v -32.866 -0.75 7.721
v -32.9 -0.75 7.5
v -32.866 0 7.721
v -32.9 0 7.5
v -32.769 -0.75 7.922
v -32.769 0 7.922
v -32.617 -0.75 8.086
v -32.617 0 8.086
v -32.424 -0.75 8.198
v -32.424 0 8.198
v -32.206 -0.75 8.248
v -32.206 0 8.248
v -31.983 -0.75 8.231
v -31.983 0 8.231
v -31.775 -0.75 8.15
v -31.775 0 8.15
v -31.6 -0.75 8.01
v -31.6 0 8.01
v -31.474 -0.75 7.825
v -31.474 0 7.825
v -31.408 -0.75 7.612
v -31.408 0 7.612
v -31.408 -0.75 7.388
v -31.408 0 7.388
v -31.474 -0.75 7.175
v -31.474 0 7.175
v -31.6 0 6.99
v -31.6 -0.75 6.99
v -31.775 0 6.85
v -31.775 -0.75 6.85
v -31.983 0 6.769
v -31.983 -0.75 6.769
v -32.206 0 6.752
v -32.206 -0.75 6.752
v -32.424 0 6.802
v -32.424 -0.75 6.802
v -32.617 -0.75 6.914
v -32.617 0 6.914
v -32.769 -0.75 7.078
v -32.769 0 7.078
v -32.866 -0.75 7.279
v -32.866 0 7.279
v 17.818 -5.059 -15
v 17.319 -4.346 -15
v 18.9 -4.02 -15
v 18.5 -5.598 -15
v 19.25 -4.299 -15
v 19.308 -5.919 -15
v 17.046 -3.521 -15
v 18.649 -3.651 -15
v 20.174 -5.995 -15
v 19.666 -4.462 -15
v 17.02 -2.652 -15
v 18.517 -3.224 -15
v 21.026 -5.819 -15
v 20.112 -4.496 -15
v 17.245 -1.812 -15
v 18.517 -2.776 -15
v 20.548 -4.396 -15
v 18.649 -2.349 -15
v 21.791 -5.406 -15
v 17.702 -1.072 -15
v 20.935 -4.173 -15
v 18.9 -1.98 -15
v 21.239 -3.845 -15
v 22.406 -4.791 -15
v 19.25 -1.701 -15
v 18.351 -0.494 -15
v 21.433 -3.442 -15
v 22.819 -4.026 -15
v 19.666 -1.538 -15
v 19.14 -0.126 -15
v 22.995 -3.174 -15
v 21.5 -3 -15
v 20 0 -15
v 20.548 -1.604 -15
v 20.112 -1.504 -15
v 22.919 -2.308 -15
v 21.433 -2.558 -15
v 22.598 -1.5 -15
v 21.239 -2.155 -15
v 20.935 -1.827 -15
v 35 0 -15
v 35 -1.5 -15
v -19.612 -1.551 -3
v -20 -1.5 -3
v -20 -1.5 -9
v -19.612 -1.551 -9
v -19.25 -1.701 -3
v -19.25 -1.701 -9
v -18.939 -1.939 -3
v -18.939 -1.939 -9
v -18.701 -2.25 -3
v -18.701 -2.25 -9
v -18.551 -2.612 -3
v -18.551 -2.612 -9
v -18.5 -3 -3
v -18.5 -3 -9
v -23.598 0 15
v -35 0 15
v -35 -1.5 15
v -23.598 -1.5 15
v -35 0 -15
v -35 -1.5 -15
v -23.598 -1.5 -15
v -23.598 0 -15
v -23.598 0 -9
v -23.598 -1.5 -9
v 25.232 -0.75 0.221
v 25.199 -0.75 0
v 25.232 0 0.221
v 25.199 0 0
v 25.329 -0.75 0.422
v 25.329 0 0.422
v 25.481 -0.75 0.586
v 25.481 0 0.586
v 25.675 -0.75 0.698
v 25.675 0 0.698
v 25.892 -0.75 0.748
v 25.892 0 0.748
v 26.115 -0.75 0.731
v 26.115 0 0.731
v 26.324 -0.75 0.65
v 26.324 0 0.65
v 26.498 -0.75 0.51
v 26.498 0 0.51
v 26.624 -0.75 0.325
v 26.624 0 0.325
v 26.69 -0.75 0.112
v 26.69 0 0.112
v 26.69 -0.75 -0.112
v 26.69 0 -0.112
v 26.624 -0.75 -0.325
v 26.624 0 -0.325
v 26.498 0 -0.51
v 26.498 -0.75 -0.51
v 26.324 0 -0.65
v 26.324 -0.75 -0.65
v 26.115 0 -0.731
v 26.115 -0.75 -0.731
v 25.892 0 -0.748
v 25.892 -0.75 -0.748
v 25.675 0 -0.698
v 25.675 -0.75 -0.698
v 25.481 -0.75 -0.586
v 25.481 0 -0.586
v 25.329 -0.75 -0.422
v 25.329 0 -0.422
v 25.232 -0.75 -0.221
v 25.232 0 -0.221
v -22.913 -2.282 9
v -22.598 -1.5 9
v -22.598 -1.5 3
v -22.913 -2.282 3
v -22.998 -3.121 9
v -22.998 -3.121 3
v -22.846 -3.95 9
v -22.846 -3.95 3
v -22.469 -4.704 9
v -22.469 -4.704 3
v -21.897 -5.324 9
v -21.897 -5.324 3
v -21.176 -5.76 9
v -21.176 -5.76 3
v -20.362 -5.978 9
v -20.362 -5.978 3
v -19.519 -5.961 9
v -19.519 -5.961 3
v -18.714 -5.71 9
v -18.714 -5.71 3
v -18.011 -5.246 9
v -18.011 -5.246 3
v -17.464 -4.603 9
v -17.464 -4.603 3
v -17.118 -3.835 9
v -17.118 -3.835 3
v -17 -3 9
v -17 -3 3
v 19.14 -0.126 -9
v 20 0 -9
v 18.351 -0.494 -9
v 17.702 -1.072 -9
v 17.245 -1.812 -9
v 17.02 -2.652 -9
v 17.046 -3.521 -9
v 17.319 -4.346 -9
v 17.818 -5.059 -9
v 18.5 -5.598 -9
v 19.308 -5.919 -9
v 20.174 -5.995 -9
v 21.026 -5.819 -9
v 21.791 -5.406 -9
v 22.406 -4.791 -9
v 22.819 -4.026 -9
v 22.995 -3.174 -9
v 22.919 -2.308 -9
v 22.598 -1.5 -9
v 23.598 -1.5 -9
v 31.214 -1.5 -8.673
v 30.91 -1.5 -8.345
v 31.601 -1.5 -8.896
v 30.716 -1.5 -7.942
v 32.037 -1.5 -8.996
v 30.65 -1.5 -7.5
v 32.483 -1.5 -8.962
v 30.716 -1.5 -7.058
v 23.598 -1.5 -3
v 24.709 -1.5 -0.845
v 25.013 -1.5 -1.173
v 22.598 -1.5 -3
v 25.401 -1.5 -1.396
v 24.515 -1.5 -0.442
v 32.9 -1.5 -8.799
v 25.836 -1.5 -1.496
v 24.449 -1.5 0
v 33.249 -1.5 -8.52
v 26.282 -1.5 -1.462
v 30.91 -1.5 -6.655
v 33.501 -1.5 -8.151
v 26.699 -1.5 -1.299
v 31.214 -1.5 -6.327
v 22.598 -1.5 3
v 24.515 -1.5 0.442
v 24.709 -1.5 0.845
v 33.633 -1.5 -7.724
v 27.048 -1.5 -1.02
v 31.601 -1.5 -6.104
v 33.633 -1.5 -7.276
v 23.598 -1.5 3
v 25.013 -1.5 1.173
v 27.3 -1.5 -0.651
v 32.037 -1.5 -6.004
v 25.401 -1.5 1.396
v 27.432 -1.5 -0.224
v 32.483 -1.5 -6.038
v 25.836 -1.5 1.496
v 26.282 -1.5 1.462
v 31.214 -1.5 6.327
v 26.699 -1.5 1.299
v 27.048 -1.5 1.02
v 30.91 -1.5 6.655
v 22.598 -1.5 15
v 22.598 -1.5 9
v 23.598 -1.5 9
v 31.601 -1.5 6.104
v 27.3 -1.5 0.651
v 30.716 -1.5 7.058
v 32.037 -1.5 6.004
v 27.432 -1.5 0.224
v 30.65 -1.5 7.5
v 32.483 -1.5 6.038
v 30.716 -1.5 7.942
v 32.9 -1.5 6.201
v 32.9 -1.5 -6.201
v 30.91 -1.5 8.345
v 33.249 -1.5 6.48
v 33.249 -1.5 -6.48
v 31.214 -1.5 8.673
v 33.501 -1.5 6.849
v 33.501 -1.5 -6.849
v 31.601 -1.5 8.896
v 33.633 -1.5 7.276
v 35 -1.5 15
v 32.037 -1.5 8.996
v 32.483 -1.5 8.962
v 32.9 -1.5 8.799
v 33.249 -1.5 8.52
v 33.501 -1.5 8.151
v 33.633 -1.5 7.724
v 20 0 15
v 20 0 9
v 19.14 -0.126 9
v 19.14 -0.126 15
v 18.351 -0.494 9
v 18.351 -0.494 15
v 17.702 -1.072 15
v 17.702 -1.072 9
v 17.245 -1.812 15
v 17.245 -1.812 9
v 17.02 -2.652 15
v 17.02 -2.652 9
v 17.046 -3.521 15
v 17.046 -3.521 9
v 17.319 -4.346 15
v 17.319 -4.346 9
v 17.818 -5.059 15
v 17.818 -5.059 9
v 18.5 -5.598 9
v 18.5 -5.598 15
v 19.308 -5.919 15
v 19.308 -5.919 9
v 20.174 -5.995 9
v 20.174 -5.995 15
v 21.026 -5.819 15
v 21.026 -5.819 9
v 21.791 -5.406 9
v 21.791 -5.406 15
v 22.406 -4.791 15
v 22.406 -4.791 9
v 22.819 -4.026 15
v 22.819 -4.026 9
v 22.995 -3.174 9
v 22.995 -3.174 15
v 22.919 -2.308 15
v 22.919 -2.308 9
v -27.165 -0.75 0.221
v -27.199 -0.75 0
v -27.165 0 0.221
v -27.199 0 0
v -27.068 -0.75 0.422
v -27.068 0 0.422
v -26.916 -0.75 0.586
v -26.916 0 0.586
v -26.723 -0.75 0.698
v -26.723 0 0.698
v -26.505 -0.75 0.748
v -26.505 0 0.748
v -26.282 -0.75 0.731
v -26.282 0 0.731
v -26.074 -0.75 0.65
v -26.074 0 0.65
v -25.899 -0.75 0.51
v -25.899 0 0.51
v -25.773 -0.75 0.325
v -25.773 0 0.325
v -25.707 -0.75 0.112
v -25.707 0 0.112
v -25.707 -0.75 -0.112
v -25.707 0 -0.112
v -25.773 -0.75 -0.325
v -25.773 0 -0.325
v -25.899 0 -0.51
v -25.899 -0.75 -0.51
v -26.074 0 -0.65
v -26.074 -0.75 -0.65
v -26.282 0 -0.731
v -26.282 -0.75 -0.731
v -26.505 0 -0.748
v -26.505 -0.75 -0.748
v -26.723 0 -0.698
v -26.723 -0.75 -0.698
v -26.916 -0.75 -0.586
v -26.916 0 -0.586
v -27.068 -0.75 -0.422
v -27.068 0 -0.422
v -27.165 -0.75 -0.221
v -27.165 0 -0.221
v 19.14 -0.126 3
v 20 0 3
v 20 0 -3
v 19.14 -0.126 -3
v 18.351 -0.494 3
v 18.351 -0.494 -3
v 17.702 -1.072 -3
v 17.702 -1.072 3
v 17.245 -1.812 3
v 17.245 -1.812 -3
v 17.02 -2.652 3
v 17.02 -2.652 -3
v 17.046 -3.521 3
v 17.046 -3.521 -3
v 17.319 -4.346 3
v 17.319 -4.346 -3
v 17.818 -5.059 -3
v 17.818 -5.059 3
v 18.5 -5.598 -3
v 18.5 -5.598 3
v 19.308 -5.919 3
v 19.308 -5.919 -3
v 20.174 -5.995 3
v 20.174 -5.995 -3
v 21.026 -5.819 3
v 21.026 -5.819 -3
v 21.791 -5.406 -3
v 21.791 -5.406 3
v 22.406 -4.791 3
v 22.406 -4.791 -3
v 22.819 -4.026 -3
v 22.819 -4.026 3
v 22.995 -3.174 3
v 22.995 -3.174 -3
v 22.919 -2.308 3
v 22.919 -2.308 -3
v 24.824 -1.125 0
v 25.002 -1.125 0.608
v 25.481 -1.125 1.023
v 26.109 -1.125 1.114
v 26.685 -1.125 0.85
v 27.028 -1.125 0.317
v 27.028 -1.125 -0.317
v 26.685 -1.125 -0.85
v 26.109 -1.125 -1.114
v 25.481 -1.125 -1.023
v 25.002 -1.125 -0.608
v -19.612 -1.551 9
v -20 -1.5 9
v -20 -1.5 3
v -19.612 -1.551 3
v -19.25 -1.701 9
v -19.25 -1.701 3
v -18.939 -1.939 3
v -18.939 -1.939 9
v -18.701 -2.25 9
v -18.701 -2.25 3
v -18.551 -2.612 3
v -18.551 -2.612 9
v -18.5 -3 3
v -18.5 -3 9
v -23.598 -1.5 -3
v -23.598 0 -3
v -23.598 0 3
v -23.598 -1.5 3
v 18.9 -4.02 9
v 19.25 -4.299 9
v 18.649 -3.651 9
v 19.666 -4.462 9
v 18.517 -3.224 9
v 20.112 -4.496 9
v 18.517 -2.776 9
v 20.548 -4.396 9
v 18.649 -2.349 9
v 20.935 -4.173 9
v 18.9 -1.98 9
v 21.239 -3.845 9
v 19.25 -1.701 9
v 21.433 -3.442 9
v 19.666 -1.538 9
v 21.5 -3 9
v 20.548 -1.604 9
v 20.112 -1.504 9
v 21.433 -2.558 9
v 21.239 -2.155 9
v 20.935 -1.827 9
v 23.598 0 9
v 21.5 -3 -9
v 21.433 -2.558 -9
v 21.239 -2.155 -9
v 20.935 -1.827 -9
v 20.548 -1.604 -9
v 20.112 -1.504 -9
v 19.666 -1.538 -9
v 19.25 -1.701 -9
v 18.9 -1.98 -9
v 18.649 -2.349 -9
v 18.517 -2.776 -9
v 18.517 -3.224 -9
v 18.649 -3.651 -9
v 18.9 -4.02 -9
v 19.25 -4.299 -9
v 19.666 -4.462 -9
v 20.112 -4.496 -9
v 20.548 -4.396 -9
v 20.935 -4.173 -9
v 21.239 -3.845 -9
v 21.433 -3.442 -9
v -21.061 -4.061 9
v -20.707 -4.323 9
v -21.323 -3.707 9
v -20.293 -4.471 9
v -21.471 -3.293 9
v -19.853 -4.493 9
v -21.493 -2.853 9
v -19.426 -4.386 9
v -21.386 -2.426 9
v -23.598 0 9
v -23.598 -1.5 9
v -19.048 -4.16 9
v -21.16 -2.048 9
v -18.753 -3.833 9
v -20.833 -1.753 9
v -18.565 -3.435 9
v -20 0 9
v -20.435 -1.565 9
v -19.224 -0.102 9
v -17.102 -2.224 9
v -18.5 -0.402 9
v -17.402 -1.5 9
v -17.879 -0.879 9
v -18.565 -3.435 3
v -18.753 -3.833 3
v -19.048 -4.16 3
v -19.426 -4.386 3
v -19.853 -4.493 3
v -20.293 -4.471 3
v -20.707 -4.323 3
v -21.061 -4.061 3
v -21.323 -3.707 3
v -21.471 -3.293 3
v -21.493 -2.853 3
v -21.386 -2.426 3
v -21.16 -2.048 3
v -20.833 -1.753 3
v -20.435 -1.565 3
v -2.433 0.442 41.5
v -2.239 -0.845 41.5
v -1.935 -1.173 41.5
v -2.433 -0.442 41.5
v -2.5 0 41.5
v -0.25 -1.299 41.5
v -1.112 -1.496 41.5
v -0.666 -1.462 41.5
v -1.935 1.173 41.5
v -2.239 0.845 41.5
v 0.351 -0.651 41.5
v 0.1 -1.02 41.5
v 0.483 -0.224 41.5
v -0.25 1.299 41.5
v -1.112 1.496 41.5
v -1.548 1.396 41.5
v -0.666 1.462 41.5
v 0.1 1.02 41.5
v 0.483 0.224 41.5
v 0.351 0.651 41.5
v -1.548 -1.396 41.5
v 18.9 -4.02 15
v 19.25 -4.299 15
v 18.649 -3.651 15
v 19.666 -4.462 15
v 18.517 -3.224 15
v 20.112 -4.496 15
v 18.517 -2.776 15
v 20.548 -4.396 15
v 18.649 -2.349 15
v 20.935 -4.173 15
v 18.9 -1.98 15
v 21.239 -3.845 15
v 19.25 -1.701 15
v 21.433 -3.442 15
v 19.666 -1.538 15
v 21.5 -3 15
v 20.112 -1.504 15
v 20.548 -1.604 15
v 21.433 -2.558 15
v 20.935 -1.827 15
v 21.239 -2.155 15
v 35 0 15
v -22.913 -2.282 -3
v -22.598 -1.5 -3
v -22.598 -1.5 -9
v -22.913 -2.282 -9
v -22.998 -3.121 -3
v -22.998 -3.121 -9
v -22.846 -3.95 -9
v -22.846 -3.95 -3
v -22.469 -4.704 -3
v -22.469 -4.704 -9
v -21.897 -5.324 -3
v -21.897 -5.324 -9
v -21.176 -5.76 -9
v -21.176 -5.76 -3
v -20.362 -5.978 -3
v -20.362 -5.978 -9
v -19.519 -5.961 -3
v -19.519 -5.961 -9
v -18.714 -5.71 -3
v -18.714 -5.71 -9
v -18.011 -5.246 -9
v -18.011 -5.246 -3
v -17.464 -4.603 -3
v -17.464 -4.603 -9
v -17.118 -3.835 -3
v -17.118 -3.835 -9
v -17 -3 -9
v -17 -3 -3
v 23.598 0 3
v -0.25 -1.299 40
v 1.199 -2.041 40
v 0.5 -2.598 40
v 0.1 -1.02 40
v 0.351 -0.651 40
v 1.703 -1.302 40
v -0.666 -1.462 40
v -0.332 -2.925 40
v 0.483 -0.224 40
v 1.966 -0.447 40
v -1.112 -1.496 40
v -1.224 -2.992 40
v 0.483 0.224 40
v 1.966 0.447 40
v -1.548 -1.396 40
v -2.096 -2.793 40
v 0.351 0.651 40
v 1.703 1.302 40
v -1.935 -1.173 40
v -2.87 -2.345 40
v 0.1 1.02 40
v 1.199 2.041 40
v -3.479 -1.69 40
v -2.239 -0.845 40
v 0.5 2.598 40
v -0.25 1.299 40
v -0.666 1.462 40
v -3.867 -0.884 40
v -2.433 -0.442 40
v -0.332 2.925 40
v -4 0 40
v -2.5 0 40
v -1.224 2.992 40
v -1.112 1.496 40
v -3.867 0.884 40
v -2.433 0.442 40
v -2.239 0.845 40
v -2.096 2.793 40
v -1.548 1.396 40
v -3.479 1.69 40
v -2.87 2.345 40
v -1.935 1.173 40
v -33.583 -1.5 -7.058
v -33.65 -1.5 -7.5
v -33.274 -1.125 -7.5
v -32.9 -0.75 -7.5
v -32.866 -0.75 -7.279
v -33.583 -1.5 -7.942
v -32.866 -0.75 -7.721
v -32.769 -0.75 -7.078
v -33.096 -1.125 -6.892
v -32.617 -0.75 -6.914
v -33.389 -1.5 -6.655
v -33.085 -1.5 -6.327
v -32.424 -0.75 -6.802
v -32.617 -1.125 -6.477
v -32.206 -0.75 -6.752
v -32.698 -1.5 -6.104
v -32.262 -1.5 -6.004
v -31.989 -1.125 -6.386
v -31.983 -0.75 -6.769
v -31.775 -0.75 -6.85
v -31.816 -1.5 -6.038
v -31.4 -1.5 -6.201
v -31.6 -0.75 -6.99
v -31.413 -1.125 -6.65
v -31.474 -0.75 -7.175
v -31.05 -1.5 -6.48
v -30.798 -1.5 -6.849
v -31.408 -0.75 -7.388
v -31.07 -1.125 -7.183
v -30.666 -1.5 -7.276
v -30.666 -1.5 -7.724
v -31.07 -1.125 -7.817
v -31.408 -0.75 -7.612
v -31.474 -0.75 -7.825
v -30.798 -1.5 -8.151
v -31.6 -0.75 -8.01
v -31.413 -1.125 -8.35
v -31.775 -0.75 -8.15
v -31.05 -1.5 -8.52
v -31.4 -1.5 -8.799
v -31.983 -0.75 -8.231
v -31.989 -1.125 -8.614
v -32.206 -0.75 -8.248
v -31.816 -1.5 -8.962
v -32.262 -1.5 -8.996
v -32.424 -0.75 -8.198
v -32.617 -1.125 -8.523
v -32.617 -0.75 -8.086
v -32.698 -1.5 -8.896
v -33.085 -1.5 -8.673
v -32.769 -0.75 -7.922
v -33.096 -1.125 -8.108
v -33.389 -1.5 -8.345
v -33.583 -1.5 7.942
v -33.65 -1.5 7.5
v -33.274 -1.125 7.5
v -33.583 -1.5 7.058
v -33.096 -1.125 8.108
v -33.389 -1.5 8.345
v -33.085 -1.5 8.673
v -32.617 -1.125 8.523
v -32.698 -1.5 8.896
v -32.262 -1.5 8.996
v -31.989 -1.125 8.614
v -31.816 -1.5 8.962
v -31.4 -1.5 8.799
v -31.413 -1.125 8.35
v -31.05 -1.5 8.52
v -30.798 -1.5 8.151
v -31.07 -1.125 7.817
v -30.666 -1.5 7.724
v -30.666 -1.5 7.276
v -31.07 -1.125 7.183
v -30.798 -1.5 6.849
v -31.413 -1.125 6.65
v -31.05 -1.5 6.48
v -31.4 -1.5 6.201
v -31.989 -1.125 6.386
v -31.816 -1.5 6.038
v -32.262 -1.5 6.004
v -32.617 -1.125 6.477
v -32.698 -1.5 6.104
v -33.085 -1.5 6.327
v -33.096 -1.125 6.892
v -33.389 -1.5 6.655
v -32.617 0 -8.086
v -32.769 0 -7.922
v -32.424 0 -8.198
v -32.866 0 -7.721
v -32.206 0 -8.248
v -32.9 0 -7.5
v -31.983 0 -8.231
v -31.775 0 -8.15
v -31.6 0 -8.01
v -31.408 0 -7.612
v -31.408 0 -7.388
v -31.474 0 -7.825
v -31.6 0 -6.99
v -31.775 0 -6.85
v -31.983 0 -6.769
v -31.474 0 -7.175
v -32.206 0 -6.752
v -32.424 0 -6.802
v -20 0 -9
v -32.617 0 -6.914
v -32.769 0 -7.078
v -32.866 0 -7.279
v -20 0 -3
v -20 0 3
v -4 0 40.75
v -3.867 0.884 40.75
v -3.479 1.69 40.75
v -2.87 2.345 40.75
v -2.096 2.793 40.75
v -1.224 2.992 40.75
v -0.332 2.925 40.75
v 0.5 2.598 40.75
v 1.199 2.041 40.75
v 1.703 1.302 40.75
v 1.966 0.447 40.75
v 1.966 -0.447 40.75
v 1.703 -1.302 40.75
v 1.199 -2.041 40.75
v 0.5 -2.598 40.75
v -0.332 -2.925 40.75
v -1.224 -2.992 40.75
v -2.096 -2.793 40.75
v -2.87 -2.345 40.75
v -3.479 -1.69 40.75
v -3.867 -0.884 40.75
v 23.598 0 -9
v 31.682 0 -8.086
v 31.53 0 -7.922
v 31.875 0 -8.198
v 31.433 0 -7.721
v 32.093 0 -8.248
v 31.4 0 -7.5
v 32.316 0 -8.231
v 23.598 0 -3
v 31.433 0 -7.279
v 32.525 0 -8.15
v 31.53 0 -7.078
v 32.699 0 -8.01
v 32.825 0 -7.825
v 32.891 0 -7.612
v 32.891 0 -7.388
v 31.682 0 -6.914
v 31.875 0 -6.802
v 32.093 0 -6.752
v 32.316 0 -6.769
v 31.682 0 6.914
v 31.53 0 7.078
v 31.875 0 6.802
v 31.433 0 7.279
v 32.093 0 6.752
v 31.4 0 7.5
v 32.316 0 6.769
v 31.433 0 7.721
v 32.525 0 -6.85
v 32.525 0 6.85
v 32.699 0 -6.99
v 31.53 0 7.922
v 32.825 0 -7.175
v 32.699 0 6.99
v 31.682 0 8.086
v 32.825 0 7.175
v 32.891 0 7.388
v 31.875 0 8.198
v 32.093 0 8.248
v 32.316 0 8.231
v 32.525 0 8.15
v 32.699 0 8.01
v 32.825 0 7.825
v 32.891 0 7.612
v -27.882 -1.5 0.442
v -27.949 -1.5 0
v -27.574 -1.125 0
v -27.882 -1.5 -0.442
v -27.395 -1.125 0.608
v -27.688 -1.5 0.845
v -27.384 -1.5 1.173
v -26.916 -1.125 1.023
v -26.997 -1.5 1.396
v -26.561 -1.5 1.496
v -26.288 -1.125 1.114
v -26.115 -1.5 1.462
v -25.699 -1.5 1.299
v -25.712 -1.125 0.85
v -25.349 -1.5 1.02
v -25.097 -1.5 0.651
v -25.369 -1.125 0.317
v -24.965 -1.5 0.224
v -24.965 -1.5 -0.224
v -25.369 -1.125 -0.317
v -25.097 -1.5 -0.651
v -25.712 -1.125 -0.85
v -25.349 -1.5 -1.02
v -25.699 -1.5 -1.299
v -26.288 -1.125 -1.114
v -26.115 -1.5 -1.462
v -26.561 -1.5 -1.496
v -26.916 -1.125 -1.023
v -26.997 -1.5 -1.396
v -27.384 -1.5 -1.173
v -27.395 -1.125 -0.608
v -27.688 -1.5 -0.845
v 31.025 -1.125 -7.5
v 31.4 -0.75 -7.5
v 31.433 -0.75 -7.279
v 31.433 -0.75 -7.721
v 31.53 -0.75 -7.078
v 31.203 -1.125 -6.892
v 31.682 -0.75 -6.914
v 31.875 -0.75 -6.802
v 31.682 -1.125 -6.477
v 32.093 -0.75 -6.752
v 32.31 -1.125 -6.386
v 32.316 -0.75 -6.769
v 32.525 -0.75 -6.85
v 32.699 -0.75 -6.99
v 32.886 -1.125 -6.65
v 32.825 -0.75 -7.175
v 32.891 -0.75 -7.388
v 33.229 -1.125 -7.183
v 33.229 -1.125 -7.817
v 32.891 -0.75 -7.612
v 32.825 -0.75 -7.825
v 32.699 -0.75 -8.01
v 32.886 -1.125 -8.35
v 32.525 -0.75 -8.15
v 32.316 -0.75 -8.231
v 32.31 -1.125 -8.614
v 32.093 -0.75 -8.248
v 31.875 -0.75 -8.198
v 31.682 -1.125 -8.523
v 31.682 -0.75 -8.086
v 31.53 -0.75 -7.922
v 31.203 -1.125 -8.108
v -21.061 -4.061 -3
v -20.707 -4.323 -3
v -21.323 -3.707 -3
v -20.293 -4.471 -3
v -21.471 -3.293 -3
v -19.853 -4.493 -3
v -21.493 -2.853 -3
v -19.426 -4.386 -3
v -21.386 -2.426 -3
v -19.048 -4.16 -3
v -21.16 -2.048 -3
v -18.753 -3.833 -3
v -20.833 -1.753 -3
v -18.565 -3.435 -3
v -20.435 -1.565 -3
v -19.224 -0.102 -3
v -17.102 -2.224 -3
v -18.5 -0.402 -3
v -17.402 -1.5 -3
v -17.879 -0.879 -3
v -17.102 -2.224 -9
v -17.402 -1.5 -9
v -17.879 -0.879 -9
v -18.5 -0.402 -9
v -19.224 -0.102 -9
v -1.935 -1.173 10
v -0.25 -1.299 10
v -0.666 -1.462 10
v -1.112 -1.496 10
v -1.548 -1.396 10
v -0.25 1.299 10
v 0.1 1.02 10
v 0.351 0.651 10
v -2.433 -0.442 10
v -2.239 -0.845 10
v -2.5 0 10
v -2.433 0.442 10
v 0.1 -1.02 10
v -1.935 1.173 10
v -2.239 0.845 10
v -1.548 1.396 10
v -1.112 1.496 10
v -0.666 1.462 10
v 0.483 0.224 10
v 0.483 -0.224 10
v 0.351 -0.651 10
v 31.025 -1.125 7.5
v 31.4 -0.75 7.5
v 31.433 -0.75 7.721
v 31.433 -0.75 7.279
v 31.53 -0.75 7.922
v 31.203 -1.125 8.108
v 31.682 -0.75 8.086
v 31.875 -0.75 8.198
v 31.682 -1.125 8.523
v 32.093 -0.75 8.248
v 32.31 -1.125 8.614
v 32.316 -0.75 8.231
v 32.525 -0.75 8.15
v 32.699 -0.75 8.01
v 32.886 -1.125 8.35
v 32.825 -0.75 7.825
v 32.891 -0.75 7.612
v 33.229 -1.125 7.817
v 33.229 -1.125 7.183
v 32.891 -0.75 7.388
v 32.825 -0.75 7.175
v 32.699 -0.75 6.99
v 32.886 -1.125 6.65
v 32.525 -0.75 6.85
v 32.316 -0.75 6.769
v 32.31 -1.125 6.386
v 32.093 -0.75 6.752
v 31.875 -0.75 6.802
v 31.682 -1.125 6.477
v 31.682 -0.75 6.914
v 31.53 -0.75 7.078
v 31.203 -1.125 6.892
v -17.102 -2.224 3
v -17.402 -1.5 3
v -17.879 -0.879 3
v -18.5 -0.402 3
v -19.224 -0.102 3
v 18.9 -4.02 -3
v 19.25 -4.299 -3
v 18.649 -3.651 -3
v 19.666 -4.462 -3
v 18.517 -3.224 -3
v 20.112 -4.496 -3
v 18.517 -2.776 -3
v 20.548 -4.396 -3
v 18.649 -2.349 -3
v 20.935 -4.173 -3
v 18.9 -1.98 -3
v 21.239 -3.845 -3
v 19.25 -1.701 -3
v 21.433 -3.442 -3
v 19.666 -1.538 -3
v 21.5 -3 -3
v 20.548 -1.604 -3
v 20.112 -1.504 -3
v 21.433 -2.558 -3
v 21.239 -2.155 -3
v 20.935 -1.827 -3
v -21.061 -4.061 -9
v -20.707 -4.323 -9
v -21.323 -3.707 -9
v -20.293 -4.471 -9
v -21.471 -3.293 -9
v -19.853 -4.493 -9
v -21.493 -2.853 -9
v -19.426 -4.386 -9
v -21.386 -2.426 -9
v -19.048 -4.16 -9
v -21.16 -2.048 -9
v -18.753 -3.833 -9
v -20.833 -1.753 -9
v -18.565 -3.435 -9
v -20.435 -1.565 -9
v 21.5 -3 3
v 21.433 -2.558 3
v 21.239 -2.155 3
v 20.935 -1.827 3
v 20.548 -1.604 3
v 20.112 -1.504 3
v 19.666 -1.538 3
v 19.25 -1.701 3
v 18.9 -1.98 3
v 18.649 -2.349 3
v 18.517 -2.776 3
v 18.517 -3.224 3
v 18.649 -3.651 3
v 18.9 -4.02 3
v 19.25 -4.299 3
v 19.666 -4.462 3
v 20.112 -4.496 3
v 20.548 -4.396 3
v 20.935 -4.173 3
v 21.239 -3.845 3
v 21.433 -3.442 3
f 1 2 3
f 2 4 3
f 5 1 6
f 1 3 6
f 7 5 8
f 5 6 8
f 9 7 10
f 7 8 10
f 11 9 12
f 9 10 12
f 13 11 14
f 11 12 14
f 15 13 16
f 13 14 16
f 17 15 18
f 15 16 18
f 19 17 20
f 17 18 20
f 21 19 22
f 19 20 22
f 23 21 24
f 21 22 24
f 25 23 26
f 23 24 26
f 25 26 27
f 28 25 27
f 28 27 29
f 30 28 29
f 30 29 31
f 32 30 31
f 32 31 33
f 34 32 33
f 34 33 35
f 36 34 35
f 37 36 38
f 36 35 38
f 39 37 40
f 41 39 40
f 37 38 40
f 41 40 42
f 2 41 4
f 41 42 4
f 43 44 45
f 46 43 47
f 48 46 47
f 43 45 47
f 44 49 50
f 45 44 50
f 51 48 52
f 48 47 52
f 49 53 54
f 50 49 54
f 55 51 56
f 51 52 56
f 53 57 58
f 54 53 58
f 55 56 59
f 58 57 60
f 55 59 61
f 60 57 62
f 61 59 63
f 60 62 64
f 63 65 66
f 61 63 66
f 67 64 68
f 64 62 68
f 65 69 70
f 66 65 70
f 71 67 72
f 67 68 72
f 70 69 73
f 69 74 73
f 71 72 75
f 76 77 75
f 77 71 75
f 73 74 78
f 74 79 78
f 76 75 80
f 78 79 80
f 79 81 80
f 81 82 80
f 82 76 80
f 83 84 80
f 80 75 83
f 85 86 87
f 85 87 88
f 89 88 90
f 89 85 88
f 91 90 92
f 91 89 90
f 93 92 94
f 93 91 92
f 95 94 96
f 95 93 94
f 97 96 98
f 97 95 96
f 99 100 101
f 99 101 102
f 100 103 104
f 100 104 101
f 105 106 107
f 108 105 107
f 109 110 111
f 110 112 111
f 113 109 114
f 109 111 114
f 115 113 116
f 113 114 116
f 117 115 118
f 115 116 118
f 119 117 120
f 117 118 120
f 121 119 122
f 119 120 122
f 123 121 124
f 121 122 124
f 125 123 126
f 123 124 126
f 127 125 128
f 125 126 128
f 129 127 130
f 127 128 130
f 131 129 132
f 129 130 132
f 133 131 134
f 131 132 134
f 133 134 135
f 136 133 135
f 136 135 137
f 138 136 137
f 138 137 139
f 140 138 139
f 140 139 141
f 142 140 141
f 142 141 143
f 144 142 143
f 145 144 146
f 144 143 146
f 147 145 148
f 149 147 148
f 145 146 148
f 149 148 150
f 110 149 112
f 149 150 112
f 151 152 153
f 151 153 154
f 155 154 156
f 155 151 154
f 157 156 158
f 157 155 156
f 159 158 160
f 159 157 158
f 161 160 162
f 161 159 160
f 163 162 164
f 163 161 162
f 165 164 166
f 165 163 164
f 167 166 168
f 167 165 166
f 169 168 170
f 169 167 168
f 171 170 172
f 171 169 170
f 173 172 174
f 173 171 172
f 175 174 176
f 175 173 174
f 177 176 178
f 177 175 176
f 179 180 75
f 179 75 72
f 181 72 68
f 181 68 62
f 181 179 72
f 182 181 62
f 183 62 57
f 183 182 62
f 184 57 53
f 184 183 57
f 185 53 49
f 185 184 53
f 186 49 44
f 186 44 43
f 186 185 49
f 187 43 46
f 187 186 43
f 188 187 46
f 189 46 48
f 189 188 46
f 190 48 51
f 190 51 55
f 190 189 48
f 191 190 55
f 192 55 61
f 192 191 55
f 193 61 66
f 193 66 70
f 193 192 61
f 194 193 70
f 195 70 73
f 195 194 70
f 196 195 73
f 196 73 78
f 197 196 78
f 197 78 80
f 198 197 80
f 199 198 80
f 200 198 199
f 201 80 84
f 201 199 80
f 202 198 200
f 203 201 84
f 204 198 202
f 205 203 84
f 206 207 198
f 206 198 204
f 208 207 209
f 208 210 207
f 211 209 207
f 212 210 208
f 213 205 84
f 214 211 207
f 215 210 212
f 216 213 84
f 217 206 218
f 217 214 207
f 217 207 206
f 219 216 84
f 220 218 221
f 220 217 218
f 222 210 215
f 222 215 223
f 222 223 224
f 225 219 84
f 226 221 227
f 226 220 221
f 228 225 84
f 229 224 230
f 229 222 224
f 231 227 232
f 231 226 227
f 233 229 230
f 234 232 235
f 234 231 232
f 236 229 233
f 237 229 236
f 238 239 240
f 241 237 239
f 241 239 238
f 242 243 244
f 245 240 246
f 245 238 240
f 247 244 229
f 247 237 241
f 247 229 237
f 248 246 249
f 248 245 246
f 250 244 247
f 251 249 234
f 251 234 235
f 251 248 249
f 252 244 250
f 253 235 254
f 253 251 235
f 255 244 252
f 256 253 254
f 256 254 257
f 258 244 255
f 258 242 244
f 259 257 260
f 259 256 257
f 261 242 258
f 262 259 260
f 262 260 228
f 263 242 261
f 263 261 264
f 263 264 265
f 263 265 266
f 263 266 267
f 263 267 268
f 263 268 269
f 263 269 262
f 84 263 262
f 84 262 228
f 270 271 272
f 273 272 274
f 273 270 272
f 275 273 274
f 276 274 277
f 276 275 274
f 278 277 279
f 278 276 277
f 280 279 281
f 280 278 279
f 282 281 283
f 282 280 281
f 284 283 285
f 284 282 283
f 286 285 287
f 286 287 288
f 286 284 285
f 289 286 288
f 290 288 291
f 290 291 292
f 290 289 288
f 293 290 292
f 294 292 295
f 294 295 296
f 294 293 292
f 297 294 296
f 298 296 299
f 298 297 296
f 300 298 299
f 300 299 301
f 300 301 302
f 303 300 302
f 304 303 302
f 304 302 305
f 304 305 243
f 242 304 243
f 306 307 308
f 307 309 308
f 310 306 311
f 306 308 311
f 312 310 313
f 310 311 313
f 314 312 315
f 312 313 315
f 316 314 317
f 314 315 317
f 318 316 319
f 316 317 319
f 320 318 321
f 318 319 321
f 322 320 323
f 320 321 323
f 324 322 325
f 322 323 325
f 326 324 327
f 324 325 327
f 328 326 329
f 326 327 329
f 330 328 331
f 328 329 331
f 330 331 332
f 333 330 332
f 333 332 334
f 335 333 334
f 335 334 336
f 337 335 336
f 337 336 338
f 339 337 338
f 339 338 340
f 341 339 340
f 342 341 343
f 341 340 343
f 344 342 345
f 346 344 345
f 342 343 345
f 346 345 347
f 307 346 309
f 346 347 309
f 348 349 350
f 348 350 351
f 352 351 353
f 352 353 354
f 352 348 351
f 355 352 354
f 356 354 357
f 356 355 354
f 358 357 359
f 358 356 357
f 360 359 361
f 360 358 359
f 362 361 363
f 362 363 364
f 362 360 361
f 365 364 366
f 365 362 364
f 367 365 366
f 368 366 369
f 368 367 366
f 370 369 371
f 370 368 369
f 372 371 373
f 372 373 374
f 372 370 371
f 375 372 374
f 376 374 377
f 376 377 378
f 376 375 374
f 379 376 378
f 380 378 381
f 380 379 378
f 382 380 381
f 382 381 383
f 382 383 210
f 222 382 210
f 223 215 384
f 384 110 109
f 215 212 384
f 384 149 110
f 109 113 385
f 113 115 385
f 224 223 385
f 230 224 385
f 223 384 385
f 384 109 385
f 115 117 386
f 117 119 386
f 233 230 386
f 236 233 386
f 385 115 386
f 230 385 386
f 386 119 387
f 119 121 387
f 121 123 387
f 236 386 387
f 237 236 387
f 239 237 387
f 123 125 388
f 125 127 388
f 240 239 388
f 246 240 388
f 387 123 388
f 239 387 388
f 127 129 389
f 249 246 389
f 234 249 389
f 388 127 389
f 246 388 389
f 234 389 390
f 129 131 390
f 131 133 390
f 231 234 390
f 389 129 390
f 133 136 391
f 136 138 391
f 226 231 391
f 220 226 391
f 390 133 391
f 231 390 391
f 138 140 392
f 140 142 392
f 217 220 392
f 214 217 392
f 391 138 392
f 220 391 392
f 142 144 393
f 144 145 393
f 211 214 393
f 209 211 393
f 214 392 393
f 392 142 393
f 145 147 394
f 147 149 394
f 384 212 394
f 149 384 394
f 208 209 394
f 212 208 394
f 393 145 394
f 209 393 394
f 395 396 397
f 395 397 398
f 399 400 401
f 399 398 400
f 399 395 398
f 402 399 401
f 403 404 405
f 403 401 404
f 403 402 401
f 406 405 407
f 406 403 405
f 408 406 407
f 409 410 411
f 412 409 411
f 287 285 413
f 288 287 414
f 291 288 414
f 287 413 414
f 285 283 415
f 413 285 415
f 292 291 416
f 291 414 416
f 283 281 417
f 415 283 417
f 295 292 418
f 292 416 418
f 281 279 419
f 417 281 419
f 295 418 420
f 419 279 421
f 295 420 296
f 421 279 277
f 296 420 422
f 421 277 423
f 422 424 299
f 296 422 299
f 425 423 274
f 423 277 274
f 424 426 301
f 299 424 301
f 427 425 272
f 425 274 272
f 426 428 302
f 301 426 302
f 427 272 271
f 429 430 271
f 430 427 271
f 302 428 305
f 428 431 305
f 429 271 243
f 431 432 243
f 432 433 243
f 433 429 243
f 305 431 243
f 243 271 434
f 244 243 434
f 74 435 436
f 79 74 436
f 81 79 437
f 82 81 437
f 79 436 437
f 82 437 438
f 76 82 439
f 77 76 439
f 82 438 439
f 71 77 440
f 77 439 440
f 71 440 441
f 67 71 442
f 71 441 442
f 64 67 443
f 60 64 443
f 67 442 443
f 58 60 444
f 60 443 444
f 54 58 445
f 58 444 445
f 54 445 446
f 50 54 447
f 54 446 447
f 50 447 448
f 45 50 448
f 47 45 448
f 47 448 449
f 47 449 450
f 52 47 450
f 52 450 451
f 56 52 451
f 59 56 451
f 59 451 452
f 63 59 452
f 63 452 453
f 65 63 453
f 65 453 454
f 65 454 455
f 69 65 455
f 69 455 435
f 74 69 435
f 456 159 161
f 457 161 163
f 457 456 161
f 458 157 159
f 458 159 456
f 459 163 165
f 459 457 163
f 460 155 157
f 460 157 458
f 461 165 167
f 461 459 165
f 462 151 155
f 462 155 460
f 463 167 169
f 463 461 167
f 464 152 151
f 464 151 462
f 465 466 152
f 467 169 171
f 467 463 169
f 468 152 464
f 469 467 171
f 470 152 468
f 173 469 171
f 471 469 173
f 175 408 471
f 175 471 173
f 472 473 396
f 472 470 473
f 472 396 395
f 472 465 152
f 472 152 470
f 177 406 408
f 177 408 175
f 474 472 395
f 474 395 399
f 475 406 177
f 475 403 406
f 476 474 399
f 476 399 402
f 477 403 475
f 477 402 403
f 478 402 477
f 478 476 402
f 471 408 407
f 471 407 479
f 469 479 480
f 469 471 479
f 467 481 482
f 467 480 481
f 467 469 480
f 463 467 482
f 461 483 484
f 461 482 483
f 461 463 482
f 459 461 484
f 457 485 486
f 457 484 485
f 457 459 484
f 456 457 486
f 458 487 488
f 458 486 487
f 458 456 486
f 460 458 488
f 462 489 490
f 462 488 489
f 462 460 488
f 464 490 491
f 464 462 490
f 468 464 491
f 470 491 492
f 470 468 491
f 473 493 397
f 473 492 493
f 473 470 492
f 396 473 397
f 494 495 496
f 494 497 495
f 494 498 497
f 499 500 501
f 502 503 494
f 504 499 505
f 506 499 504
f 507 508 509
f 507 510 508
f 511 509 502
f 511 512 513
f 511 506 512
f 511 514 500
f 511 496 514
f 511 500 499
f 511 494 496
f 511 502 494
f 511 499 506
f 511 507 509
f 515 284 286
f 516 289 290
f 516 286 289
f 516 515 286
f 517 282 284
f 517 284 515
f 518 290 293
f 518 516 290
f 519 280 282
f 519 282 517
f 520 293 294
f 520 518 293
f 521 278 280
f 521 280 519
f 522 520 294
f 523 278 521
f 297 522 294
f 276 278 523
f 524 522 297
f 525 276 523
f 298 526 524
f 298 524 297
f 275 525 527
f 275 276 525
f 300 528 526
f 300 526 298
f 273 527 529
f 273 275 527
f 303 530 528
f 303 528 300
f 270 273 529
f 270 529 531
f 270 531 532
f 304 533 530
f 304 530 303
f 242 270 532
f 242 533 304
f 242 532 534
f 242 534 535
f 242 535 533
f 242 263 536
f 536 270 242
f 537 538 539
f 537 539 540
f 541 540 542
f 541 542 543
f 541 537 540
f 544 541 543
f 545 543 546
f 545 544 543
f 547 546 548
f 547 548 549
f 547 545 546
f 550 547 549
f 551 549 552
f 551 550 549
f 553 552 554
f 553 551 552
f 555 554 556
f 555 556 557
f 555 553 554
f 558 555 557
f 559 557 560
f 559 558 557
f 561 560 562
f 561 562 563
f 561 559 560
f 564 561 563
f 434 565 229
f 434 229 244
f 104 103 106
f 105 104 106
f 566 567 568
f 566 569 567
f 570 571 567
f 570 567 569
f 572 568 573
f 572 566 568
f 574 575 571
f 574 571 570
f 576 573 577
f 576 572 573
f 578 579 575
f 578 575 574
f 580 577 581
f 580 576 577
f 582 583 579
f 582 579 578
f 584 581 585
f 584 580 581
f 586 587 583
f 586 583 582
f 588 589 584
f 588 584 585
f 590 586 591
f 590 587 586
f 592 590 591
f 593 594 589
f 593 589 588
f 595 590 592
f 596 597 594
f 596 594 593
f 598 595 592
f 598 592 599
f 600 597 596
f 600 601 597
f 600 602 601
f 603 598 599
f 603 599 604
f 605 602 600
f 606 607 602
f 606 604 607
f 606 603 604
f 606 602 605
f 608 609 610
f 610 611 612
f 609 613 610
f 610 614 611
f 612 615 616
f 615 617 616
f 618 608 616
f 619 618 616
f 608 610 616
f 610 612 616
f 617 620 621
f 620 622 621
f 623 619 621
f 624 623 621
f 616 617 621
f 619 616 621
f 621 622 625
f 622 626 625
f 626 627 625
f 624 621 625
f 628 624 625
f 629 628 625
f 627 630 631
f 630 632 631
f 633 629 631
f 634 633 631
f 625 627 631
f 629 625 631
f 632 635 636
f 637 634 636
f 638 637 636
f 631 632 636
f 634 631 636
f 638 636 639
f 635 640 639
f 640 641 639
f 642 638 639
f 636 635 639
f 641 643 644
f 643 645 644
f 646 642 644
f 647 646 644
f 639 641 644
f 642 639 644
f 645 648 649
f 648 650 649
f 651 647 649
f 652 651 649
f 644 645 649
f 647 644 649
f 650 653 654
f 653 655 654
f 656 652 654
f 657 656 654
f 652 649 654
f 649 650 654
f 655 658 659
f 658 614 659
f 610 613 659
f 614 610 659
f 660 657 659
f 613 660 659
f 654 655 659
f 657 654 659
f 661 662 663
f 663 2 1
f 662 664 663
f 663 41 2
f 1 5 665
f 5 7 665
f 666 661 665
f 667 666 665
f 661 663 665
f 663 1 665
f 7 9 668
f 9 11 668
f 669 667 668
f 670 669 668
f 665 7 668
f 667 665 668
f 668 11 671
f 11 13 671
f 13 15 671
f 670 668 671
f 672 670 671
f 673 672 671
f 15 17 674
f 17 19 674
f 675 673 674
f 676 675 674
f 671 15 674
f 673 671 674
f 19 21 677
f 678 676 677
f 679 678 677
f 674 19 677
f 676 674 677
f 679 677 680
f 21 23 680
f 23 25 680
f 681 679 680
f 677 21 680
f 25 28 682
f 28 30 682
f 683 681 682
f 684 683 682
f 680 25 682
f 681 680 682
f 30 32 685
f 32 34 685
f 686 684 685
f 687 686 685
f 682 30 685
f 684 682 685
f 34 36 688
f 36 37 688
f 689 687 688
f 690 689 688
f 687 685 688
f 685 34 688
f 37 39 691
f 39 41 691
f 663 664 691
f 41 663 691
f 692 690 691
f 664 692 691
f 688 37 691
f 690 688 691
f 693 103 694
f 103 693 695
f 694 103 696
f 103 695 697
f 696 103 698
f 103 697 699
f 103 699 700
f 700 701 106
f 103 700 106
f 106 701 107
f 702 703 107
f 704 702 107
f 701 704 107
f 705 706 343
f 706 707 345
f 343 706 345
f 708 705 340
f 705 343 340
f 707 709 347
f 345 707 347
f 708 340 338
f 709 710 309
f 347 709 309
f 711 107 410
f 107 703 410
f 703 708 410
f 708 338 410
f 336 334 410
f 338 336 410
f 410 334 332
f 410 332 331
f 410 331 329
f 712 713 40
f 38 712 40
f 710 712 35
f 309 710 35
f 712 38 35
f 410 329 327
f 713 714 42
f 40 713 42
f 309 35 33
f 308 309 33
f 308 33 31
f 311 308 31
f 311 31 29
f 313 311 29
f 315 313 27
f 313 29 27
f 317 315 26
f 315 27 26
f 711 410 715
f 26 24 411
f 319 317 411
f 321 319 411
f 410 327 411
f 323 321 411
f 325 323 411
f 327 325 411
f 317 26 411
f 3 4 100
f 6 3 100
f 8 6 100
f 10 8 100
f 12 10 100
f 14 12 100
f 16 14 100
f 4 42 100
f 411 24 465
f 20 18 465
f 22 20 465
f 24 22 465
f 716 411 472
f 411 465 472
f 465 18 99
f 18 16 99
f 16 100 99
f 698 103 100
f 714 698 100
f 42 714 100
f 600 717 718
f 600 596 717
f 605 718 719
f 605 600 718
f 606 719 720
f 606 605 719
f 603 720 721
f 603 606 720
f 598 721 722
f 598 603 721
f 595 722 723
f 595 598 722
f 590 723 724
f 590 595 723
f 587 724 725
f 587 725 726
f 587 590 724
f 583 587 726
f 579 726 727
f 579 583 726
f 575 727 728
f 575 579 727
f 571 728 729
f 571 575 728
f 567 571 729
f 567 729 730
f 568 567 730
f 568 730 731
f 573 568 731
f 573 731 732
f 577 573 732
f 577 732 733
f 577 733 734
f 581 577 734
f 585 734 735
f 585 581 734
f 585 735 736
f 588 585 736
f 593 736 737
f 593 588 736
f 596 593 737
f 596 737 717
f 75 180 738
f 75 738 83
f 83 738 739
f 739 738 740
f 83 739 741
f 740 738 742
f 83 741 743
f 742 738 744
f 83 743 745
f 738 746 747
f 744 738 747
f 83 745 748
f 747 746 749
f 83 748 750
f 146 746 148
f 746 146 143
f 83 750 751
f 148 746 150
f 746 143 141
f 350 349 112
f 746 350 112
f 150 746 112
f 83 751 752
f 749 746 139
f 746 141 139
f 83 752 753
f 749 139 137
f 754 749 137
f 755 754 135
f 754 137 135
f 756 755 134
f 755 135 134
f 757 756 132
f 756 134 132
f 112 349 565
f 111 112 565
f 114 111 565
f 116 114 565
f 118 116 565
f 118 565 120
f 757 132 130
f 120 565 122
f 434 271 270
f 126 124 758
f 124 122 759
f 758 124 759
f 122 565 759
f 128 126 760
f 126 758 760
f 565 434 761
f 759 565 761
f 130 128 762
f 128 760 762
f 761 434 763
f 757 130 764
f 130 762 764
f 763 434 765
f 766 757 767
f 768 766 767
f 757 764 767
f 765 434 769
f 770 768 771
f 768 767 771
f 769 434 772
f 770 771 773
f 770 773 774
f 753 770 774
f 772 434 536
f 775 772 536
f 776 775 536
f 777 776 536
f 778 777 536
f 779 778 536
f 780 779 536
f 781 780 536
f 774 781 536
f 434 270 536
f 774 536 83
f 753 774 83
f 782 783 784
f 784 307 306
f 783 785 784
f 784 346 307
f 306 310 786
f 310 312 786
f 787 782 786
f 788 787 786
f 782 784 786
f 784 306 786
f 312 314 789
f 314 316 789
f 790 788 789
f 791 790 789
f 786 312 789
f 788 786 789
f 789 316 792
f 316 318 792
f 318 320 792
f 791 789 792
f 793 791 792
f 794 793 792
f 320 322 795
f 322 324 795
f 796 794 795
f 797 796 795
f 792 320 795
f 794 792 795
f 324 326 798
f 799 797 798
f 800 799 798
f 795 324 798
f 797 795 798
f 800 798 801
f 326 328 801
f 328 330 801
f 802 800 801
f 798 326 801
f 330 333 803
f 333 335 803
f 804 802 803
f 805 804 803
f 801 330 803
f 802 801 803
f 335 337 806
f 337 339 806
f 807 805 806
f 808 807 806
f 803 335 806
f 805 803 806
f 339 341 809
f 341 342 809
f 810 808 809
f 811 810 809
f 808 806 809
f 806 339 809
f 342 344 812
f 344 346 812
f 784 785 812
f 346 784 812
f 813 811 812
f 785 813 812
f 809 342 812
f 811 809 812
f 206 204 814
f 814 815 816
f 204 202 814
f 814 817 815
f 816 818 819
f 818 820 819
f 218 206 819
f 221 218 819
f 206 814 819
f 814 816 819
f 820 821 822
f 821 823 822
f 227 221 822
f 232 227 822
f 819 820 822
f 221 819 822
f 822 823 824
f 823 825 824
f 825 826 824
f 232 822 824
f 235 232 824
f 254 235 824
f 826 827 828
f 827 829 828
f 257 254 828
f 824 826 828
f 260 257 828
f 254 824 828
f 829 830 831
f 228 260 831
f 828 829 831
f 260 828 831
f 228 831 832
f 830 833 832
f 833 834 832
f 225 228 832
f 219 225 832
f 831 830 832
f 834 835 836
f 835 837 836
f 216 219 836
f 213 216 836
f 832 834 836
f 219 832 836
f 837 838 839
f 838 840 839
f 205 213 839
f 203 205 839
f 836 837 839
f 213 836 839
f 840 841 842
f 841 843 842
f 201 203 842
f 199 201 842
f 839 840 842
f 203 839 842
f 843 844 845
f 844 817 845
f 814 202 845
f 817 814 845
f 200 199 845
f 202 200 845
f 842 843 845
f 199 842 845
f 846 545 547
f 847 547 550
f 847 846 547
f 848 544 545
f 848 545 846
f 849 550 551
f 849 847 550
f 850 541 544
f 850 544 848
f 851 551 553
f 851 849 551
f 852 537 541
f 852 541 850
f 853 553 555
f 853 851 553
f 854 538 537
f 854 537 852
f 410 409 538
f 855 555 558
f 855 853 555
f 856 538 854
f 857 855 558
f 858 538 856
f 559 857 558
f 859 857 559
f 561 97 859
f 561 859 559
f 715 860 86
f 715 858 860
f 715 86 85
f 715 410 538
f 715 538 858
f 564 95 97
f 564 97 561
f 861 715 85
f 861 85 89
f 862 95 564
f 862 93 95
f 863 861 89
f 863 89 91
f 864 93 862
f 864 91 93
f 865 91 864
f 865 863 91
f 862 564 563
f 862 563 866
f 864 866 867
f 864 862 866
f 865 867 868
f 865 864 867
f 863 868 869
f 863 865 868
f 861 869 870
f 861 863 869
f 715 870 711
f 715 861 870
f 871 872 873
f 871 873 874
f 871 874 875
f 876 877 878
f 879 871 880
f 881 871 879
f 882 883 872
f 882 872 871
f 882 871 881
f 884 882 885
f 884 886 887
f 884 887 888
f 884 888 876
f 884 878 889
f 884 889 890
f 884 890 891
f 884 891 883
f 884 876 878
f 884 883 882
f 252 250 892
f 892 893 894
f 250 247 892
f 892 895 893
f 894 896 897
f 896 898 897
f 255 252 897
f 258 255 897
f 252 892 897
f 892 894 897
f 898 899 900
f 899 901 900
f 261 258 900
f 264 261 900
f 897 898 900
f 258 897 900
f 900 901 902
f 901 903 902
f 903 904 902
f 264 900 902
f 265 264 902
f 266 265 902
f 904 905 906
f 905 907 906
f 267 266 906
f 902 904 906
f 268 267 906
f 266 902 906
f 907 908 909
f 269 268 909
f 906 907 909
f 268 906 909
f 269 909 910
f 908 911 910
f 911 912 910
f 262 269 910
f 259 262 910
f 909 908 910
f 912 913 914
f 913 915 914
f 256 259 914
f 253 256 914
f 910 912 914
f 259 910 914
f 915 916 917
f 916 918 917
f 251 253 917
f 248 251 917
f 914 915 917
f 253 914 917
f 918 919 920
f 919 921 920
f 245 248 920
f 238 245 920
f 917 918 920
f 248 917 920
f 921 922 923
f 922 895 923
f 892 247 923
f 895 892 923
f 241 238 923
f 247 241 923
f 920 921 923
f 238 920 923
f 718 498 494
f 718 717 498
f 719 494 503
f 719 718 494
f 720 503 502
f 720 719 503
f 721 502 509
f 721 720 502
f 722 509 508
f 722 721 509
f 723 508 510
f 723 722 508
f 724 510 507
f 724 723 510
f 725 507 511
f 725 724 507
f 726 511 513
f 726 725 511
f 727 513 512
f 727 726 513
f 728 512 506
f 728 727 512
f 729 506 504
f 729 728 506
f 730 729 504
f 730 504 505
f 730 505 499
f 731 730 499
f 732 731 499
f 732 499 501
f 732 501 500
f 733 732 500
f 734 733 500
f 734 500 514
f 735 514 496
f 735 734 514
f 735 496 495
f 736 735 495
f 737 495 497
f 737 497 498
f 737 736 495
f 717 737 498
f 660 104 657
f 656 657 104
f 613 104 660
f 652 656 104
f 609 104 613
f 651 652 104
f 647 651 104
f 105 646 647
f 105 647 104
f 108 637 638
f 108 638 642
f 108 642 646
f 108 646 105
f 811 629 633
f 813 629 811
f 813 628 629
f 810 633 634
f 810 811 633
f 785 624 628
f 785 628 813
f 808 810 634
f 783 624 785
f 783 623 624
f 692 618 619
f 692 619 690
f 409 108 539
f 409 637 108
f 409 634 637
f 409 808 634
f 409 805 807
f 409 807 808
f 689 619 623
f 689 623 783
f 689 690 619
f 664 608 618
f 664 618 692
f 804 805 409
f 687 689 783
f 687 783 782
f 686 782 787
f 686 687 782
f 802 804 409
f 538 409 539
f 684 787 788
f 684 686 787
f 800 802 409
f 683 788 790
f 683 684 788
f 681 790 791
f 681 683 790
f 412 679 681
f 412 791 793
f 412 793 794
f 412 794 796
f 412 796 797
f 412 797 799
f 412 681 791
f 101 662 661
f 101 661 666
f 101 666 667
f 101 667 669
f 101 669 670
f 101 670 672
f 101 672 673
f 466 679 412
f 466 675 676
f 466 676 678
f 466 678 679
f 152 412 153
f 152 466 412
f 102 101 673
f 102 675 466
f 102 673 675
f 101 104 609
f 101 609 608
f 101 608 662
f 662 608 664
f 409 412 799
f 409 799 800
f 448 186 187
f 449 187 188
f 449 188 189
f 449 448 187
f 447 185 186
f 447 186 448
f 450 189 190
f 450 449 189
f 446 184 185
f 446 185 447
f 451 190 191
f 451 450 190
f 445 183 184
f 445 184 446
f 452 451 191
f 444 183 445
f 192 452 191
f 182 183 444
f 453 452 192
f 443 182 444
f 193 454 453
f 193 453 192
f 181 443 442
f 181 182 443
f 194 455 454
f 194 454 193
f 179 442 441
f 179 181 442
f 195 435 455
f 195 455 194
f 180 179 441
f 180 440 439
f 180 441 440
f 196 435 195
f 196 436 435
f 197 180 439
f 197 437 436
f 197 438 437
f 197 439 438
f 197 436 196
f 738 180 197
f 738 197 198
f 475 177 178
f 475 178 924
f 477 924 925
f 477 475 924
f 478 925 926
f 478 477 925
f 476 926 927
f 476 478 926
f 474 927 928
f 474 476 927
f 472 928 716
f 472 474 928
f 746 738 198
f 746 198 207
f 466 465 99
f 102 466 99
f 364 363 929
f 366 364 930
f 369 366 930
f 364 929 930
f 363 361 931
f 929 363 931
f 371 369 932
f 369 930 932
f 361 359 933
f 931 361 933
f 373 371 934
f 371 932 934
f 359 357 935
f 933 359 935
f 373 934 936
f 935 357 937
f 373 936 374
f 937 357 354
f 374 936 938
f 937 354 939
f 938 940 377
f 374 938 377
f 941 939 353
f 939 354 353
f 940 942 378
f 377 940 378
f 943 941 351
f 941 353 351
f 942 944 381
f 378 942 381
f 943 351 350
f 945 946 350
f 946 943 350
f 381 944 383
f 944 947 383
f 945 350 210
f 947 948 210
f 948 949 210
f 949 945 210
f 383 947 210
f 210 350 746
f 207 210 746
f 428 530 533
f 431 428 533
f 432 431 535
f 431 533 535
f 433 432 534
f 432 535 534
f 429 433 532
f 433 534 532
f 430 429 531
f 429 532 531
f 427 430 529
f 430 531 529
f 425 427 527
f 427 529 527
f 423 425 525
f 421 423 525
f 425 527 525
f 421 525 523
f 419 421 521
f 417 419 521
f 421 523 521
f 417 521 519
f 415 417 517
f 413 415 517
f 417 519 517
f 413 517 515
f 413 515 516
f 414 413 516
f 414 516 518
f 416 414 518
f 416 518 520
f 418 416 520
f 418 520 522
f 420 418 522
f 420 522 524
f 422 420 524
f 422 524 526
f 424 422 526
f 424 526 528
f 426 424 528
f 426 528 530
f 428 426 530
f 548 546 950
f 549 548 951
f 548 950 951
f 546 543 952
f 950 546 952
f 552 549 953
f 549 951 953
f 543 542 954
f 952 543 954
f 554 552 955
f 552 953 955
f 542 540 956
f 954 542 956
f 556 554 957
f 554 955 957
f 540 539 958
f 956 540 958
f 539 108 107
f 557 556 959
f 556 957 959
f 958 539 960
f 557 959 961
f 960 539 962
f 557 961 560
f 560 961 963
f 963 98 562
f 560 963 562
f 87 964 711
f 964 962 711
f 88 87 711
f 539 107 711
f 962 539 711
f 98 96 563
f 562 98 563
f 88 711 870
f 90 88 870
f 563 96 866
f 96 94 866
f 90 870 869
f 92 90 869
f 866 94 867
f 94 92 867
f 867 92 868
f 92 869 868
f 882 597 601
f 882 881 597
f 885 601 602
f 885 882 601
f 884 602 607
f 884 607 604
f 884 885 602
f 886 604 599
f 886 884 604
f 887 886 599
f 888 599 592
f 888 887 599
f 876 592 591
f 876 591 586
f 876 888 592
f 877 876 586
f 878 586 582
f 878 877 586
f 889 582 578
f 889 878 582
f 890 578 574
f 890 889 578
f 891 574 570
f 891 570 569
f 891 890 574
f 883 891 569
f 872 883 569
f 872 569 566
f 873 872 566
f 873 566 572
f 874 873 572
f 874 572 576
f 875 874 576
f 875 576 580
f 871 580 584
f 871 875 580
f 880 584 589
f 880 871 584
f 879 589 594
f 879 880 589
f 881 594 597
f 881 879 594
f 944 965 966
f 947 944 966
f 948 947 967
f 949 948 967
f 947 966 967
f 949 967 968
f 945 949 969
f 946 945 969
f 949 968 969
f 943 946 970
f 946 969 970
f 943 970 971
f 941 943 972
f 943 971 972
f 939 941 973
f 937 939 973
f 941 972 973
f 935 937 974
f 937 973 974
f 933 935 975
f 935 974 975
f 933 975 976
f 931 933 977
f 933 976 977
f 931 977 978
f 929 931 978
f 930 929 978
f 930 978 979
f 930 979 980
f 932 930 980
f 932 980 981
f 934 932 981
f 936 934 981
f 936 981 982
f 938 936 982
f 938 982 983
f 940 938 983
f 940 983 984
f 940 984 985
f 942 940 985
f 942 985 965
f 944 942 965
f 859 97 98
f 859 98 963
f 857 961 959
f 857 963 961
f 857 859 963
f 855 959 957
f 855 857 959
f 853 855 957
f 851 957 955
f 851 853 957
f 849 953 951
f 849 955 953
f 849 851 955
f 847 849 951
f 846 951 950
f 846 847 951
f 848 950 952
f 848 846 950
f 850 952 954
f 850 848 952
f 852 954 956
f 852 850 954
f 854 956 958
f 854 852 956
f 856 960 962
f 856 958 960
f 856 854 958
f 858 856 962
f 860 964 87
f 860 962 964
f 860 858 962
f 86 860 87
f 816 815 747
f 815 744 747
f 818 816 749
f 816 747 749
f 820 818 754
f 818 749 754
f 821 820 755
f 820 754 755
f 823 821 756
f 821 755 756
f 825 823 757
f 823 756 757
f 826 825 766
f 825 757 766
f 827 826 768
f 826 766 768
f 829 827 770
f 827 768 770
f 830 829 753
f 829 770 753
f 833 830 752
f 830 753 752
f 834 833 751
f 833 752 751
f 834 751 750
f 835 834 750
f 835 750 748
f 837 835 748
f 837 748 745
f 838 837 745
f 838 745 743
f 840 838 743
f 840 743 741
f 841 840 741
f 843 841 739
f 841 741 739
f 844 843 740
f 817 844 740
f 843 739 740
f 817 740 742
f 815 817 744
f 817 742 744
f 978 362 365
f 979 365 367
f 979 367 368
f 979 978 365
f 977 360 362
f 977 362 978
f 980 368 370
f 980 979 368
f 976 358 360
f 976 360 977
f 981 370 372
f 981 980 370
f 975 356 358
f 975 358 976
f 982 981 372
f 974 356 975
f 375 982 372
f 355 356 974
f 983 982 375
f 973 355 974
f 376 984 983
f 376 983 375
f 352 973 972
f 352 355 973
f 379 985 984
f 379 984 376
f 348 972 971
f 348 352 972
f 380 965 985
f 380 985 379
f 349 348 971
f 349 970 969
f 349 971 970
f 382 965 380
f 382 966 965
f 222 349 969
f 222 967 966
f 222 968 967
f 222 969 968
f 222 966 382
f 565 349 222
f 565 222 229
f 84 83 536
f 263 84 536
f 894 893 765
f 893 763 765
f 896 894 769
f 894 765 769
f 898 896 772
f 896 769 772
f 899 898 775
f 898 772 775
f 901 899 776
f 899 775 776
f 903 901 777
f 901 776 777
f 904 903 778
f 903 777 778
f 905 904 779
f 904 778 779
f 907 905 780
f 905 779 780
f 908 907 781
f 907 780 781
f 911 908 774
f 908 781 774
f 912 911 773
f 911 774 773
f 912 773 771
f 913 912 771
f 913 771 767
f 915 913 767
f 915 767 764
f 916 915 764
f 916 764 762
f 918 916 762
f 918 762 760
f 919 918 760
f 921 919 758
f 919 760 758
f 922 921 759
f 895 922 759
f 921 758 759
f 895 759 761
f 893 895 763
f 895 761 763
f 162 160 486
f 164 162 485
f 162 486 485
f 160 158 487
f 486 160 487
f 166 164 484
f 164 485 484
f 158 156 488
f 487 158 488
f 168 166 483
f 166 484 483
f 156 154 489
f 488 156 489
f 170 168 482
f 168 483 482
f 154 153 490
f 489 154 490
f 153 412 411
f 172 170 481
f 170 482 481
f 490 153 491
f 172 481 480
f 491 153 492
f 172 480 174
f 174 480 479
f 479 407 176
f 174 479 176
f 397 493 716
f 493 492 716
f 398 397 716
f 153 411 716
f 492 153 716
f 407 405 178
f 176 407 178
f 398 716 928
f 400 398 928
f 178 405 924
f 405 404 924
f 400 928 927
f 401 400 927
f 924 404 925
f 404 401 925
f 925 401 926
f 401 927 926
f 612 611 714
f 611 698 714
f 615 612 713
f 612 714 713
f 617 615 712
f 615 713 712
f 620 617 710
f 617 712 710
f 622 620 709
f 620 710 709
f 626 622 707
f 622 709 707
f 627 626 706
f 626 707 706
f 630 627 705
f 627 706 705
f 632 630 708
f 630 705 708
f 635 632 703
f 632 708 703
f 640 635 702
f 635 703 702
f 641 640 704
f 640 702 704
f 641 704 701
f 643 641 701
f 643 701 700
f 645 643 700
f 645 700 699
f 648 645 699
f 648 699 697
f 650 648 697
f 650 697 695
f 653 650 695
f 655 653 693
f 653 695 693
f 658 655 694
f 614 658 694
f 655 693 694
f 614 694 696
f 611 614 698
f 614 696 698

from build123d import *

# Parameters (mm, degrees)
F0_W                   = 15
F0_H                   = 30
F1_DEPTH               = 1.5
F3_DEPTH               = 30
F4_R                   = 3
F4_R_2                 = 1.5
F5_DEPTH               = 30
F6_W                   = 7
F6_H                   = 6
F7_DEPTH               = 25
F12_D                  = 1.5
F12_CSINK_D            = 3
F12_CSINK_ANGLE        = 90
F12_ON_F11_D           = 1.5
F12_ON_F11_CSINK_D     = 3
F12_ON_F11_CSINK_ANGLE = 90


with BuildPart() as f1:
    # F0 (on Front) → F1 (new body)
    with BuildSketch(Plane.XZ):
        with Locations((-27.5, 0)):
            Rectangle(F0_W, F0_H)
    extrude(amount=F1_DEPTH)

    # F2 (on face) → F3 (join, through all)
    with BuildSketch(Plane.XY.offset(15)):
        with BuildLine():
            Line((-20, 0), (-20, -1.5))
            Line((-20, -1.5), (-22.5980762114, -1.5))
            ThreePointArc((-22.5980762114, -1.5), (-20.7764571353, -5.8977774789), (-17, -3))
            ThreePointArc((-17, -3), (-17.8786796564, -0.8786796564), (-20, 0))
        make_face()
        with BuildLine():
            ThreePointArc((-20, -1.5), (-18.9393398282, -1.9393398282), (-18.5, -3))
            ThreePointArc((-18.5, -3), (-21.0606601718, -4.0606601718), (-20, -1.5))
        make_face(mode=Mode.SUBTRACT)
        with BuildLine():
            Line((-22.5980762114, -1.5), (-20, -1.5))
            Line((-20, -1.5), (-20, 0))
            ThreePointArc((-20, 0), (-21.5, -0.4019237886), (-22.5980762114, -1.5))
        make_face()
    extrude(amount=-F3_DEPTH)


with BuildPart() as f1b:
    # F0 (on Front) → F1, piece 2 (new body)
    with BuildSketch(Plane.XZ):
        with Locations((27.5, 0)):
            Rectangle(F0_W, F0_H)
    extrude(amount=F1_DEPTH)

    # F4 (on face) → F5 (join, through all)
    with BuildSketch(Plane.XY.offset(15)):
        with Locations((20, -3)):
            Circle(F4_R)
        with Locations((20, -3)):
            Circle(F4_R_2, mode=Mode.SUBTRACT)
    extrude(amount=-F5_DEPTH)


with BuildPart() as f7_tool:
    # F6 (on Front) → F7 (new body)
    with BuildSketch(Plane.XZ):
        with Locations((-20.0980762114, 12)):
            Rectangle(F6_W, F6_H)
        with Locations((20.0980762114, 6)):
            Rectangle(F6_W, F6_H)
        with Locations((-20.0980762114, 0)):
            Rectangle(F6_W, F6_H)
        with Locations((20.0980762114, -6)):
            Rectangle(F6_W, F6_H)
        with Locations((-20.0980762114, -12)):
            Rectangle(F6_W, F6_H)
    extrude(amount=F7_DEPTH)


with BuildPart() as f1_1:
    add(f1.part)

    # F7: cut by f7_tool
    add(f7_tool.part, mode=Mode.SUBTRACT)

    # F12 (through all)
    with Locations(Plane.XZ.offset(1.5)):
        with Locations((-32.1495, 7.5), (-26.4485762114, 0), (-32.1495, -7.5)):
            CounterSinkHole(F12_D / 2, F12_CSINK_D / 2, counter_sink_angle=F12_CSINK_ANGLE)


with BuildPart() as f1b_1:
    add(f1b.part)

    # F7: cut by f7_tool
    add(f7_tool.part, mode=Mode.SUBTRACT)

    # F12 on F11 (through all)
    with Locations(Plane.XZ.offset(1.5)):
        with Locations((32.1495, -7.5), (25.9485381057, 0), (32.1495, 7.5)):
            CounterSinkHole(F12_ON_F11_D / 2, F12_ON_F11_CSINK_D / 2, counter_sink_angle=F12_ON_F11_CSINK_ANGLE)


with BuildPart() as f9:
    # F8 (on Front) → F9 (revolve)
    with BuildSketch(Plane.XZ):
        Polygon((-1, 41.5), (-2.5, 41.5), (-4, 40.75), (-4, 40), (-2.5, 40), (-2.5, 10), (-1, 10), align=None)
    revolve(axis=Axis((-1, 0, 25.75), (0, 0, -1)))


solid = Compound([f1_1.part, f1b_1.part, f9.part])
